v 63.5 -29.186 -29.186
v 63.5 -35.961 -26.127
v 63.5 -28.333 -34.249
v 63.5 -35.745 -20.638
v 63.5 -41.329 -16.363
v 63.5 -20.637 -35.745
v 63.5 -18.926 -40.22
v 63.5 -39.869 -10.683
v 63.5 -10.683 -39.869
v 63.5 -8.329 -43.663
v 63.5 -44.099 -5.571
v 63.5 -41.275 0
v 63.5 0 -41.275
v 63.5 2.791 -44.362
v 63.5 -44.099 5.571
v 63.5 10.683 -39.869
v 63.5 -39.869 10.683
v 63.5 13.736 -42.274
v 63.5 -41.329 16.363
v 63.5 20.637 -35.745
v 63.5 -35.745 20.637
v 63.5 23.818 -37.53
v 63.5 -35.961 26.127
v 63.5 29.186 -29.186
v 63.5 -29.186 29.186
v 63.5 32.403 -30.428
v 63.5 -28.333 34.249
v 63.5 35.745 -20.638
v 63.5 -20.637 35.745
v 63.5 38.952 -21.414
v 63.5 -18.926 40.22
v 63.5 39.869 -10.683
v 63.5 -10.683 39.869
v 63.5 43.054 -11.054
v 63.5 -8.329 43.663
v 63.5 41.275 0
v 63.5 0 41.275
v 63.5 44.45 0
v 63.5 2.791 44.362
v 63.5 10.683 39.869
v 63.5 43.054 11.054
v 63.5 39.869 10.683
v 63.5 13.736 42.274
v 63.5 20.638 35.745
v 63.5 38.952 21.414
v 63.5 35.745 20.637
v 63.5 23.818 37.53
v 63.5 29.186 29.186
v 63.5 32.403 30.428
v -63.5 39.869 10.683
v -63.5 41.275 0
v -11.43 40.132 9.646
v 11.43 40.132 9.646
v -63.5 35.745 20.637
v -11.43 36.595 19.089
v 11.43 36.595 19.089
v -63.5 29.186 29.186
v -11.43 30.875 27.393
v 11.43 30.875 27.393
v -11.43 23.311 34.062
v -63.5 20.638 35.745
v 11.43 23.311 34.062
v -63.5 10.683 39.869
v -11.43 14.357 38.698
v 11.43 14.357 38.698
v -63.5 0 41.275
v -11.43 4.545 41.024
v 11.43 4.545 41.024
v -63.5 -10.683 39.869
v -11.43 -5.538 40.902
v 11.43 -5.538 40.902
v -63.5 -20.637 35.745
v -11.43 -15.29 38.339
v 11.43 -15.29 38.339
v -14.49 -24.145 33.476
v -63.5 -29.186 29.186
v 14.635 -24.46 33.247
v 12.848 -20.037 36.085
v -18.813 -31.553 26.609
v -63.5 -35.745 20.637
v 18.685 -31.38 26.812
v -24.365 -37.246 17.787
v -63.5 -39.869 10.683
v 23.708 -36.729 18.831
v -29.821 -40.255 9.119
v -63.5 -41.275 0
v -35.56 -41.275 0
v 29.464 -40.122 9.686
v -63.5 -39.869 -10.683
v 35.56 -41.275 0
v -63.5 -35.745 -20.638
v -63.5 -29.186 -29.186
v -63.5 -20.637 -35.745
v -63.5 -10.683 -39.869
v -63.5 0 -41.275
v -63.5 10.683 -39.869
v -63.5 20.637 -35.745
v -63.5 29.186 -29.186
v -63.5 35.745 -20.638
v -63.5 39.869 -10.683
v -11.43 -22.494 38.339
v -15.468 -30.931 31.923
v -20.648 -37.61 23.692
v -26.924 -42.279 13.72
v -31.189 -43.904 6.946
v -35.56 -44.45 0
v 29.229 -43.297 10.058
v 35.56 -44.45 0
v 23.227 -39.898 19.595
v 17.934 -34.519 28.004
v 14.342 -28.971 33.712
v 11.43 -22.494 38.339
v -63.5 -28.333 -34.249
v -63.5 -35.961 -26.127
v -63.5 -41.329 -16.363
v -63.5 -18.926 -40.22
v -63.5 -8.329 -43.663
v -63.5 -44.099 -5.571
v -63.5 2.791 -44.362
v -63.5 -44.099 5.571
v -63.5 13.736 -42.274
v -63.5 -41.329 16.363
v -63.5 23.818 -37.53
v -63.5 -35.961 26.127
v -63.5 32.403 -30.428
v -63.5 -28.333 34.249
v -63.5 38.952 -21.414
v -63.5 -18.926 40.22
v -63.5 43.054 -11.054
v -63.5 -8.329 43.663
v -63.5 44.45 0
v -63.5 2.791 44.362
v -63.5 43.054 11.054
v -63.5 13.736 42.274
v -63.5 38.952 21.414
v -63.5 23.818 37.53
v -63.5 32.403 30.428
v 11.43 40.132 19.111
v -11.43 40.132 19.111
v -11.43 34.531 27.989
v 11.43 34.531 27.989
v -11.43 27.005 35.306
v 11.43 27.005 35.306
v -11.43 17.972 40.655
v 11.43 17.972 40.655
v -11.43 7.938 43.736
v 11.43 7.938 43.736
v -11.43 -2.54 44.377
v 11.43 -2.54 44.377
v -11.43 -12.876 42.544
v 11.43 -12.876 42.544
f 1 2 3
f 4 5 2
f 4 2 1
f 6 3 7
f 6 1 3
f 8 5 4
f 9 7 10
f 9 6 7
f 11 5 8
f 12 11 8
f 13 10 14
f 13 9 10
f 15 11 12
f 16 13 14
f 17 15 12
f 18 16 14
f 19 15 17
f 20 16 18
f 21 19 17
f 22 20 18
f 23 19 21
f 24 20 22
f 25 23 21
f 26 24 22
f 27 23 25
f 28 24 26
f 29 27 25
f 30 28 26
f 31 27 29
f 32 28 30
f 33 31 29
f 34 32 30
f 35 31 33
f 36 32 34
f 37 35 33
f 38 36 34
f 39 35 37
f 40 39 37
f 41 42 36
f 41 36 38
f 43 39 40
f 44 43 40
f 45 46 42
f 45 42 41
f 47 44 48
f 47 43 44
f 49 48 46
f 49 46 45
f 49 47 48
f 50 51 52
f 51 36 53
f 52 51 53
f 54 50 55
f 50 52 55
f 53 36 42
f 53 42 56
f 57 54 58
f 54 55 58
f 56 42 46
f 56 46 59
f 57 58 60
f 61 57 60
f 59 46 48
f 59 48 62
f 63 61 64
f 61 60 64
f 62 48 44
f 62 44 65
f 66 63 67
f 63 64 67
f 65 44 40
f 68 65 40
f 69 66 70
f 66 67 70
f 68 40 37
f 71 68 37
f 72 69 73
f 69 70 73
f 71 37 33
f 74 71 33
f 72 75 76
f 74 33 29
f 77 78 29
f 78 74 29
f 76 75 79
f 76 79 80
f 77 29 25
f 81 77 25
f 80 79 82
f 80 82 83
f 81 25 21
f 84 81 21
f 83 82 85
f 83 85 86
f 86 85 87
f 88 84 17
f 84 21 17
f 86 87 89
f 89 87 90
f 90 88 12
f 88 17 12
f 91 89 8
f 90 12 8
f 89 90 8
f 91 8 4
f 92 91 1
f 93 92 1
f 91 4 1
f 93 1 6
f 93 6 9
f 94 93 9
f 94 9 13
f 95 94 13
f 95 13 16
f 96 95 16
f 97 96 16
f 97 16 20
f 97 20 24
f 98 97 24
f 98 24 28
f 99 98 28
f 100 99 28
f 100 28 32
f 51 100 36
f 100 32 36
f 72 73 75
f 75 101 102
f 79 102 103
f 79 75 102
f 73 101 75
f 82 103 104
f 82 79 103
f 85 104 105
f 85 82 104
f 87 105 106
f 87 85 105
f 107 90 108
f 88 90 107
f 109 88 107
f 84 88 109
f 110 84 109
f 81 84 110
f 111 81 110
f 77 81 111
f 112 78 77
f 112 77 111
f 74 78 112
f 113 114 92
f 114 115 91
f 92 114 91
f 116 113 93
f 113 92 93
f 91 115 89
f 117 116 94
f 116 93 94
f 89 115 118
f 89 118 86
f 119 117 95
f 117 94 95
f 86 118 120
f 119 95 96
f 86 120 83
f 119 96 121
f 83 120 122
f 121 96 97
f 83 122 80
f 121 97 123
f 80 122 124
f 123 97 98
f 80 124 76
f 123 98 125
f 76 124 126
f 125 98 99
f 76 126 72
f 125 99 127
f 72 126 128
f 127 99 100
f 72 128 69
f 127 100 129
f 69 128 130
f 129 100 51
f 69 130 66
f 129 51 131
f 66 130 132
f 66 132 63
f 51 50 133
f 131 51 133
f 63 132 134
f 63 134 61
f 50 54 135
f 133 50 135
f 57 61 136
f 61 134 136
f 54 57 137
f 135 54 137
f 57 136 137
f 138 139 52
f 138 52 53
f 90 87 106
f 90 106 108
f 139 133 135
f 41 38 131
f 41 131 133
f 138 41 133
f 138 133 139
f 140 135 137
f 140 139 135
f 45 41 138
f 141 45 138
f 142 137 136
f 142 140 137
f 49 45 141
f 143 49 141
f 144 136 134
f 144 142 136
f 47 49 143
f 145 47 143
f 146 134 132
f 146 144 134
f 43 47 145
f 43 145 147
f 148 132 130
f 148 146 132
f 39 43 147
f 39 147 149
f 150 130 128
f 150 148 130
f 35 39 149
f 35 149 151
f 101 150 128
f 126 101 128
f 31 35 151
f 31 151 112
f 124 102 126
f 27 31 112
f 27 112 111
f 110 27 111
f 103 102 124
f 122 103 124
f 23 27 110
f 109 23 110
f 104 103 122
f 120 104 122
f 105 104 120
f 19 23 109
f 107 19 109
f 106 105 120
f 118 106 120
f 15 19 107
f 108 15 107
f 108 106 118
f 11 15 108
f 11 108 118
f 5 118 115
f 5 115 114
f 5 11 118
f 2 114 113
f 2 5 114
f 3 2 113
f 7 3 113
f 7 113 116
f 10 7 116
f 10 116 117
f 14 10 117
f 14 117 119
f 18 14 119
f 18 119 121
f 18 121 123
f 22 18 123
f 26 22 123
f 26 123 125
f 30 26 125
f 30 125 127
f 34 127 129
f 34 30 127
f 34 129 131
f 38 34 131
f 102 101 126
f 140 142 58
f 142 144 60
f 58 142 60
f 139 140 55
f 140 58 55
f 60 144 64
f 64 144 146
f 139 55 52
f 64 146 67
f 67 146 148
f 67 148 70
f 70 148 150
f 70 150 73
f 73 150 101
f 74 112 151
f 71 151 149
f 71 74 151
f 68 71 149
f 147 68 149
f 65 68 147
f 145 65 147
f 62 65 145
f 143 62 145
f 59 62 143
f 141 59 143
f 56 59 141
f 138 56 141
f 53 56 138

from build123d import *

# Parameters (mm, degrees)
F0_R          = 44.45
F0_R_2        = 41.275
F1_DEPTH      = 63.5
F1_DEPTH_BACK = 63.5
F3_DEPTH      = 57.912
F5_DEPTH      = 91.694
F7_DEPTH      = 40.132


with BuildPart() as f1:
    # F0 (on Right) → F1 (new body, two sides)
    with BuildSketch(Plane.YZ) as f1_sk:
        Circle(F0_R)
        Circle(F0_R_2, mode=Mode.SUBTRACT)
    extrude(amount=F1_DEPTH)
    extrude(f1_sk.sketch, amount=-F1_DEPTH_BACK)

    # F2 (on Front) → F3 (cut)
    with BuildSketch(Plane.XZ):
        Polygon((-35.56, 0), (0, 0), (35.56, 0), (11.43, 38.338508), (0, 38.338508), (-11.43, 38.338508), align=None)
    extrude(amount=F3_DEPTH, mode=Mode.SUBTRACT)

    # F4 (on Top) → F5 (cut)
    with BuildSketch(Plane.XY):
        Polygon((-11.43, -23.685547), (0, -23.685547), (11.43, -23.685547), (11.43, 27.390007), (-11.43, 27.390007), align=None)
    extrude(amount=F5_DEPTH, mode=Mode.SUBTRACT)

    # F6 (on Front) → F7 (cut)
    with BuildSketch(Plane.XZ):
        Polygon((-11.43, 0), (0, 0), (11.43, 0), (11.43, 35.2511), (0, 35.2511), (-11.43, 35.2511), align=None)
    extrude(amount=-F7_DEPTH, mode=Mode.SUBTRACT)


solid = f1.part
